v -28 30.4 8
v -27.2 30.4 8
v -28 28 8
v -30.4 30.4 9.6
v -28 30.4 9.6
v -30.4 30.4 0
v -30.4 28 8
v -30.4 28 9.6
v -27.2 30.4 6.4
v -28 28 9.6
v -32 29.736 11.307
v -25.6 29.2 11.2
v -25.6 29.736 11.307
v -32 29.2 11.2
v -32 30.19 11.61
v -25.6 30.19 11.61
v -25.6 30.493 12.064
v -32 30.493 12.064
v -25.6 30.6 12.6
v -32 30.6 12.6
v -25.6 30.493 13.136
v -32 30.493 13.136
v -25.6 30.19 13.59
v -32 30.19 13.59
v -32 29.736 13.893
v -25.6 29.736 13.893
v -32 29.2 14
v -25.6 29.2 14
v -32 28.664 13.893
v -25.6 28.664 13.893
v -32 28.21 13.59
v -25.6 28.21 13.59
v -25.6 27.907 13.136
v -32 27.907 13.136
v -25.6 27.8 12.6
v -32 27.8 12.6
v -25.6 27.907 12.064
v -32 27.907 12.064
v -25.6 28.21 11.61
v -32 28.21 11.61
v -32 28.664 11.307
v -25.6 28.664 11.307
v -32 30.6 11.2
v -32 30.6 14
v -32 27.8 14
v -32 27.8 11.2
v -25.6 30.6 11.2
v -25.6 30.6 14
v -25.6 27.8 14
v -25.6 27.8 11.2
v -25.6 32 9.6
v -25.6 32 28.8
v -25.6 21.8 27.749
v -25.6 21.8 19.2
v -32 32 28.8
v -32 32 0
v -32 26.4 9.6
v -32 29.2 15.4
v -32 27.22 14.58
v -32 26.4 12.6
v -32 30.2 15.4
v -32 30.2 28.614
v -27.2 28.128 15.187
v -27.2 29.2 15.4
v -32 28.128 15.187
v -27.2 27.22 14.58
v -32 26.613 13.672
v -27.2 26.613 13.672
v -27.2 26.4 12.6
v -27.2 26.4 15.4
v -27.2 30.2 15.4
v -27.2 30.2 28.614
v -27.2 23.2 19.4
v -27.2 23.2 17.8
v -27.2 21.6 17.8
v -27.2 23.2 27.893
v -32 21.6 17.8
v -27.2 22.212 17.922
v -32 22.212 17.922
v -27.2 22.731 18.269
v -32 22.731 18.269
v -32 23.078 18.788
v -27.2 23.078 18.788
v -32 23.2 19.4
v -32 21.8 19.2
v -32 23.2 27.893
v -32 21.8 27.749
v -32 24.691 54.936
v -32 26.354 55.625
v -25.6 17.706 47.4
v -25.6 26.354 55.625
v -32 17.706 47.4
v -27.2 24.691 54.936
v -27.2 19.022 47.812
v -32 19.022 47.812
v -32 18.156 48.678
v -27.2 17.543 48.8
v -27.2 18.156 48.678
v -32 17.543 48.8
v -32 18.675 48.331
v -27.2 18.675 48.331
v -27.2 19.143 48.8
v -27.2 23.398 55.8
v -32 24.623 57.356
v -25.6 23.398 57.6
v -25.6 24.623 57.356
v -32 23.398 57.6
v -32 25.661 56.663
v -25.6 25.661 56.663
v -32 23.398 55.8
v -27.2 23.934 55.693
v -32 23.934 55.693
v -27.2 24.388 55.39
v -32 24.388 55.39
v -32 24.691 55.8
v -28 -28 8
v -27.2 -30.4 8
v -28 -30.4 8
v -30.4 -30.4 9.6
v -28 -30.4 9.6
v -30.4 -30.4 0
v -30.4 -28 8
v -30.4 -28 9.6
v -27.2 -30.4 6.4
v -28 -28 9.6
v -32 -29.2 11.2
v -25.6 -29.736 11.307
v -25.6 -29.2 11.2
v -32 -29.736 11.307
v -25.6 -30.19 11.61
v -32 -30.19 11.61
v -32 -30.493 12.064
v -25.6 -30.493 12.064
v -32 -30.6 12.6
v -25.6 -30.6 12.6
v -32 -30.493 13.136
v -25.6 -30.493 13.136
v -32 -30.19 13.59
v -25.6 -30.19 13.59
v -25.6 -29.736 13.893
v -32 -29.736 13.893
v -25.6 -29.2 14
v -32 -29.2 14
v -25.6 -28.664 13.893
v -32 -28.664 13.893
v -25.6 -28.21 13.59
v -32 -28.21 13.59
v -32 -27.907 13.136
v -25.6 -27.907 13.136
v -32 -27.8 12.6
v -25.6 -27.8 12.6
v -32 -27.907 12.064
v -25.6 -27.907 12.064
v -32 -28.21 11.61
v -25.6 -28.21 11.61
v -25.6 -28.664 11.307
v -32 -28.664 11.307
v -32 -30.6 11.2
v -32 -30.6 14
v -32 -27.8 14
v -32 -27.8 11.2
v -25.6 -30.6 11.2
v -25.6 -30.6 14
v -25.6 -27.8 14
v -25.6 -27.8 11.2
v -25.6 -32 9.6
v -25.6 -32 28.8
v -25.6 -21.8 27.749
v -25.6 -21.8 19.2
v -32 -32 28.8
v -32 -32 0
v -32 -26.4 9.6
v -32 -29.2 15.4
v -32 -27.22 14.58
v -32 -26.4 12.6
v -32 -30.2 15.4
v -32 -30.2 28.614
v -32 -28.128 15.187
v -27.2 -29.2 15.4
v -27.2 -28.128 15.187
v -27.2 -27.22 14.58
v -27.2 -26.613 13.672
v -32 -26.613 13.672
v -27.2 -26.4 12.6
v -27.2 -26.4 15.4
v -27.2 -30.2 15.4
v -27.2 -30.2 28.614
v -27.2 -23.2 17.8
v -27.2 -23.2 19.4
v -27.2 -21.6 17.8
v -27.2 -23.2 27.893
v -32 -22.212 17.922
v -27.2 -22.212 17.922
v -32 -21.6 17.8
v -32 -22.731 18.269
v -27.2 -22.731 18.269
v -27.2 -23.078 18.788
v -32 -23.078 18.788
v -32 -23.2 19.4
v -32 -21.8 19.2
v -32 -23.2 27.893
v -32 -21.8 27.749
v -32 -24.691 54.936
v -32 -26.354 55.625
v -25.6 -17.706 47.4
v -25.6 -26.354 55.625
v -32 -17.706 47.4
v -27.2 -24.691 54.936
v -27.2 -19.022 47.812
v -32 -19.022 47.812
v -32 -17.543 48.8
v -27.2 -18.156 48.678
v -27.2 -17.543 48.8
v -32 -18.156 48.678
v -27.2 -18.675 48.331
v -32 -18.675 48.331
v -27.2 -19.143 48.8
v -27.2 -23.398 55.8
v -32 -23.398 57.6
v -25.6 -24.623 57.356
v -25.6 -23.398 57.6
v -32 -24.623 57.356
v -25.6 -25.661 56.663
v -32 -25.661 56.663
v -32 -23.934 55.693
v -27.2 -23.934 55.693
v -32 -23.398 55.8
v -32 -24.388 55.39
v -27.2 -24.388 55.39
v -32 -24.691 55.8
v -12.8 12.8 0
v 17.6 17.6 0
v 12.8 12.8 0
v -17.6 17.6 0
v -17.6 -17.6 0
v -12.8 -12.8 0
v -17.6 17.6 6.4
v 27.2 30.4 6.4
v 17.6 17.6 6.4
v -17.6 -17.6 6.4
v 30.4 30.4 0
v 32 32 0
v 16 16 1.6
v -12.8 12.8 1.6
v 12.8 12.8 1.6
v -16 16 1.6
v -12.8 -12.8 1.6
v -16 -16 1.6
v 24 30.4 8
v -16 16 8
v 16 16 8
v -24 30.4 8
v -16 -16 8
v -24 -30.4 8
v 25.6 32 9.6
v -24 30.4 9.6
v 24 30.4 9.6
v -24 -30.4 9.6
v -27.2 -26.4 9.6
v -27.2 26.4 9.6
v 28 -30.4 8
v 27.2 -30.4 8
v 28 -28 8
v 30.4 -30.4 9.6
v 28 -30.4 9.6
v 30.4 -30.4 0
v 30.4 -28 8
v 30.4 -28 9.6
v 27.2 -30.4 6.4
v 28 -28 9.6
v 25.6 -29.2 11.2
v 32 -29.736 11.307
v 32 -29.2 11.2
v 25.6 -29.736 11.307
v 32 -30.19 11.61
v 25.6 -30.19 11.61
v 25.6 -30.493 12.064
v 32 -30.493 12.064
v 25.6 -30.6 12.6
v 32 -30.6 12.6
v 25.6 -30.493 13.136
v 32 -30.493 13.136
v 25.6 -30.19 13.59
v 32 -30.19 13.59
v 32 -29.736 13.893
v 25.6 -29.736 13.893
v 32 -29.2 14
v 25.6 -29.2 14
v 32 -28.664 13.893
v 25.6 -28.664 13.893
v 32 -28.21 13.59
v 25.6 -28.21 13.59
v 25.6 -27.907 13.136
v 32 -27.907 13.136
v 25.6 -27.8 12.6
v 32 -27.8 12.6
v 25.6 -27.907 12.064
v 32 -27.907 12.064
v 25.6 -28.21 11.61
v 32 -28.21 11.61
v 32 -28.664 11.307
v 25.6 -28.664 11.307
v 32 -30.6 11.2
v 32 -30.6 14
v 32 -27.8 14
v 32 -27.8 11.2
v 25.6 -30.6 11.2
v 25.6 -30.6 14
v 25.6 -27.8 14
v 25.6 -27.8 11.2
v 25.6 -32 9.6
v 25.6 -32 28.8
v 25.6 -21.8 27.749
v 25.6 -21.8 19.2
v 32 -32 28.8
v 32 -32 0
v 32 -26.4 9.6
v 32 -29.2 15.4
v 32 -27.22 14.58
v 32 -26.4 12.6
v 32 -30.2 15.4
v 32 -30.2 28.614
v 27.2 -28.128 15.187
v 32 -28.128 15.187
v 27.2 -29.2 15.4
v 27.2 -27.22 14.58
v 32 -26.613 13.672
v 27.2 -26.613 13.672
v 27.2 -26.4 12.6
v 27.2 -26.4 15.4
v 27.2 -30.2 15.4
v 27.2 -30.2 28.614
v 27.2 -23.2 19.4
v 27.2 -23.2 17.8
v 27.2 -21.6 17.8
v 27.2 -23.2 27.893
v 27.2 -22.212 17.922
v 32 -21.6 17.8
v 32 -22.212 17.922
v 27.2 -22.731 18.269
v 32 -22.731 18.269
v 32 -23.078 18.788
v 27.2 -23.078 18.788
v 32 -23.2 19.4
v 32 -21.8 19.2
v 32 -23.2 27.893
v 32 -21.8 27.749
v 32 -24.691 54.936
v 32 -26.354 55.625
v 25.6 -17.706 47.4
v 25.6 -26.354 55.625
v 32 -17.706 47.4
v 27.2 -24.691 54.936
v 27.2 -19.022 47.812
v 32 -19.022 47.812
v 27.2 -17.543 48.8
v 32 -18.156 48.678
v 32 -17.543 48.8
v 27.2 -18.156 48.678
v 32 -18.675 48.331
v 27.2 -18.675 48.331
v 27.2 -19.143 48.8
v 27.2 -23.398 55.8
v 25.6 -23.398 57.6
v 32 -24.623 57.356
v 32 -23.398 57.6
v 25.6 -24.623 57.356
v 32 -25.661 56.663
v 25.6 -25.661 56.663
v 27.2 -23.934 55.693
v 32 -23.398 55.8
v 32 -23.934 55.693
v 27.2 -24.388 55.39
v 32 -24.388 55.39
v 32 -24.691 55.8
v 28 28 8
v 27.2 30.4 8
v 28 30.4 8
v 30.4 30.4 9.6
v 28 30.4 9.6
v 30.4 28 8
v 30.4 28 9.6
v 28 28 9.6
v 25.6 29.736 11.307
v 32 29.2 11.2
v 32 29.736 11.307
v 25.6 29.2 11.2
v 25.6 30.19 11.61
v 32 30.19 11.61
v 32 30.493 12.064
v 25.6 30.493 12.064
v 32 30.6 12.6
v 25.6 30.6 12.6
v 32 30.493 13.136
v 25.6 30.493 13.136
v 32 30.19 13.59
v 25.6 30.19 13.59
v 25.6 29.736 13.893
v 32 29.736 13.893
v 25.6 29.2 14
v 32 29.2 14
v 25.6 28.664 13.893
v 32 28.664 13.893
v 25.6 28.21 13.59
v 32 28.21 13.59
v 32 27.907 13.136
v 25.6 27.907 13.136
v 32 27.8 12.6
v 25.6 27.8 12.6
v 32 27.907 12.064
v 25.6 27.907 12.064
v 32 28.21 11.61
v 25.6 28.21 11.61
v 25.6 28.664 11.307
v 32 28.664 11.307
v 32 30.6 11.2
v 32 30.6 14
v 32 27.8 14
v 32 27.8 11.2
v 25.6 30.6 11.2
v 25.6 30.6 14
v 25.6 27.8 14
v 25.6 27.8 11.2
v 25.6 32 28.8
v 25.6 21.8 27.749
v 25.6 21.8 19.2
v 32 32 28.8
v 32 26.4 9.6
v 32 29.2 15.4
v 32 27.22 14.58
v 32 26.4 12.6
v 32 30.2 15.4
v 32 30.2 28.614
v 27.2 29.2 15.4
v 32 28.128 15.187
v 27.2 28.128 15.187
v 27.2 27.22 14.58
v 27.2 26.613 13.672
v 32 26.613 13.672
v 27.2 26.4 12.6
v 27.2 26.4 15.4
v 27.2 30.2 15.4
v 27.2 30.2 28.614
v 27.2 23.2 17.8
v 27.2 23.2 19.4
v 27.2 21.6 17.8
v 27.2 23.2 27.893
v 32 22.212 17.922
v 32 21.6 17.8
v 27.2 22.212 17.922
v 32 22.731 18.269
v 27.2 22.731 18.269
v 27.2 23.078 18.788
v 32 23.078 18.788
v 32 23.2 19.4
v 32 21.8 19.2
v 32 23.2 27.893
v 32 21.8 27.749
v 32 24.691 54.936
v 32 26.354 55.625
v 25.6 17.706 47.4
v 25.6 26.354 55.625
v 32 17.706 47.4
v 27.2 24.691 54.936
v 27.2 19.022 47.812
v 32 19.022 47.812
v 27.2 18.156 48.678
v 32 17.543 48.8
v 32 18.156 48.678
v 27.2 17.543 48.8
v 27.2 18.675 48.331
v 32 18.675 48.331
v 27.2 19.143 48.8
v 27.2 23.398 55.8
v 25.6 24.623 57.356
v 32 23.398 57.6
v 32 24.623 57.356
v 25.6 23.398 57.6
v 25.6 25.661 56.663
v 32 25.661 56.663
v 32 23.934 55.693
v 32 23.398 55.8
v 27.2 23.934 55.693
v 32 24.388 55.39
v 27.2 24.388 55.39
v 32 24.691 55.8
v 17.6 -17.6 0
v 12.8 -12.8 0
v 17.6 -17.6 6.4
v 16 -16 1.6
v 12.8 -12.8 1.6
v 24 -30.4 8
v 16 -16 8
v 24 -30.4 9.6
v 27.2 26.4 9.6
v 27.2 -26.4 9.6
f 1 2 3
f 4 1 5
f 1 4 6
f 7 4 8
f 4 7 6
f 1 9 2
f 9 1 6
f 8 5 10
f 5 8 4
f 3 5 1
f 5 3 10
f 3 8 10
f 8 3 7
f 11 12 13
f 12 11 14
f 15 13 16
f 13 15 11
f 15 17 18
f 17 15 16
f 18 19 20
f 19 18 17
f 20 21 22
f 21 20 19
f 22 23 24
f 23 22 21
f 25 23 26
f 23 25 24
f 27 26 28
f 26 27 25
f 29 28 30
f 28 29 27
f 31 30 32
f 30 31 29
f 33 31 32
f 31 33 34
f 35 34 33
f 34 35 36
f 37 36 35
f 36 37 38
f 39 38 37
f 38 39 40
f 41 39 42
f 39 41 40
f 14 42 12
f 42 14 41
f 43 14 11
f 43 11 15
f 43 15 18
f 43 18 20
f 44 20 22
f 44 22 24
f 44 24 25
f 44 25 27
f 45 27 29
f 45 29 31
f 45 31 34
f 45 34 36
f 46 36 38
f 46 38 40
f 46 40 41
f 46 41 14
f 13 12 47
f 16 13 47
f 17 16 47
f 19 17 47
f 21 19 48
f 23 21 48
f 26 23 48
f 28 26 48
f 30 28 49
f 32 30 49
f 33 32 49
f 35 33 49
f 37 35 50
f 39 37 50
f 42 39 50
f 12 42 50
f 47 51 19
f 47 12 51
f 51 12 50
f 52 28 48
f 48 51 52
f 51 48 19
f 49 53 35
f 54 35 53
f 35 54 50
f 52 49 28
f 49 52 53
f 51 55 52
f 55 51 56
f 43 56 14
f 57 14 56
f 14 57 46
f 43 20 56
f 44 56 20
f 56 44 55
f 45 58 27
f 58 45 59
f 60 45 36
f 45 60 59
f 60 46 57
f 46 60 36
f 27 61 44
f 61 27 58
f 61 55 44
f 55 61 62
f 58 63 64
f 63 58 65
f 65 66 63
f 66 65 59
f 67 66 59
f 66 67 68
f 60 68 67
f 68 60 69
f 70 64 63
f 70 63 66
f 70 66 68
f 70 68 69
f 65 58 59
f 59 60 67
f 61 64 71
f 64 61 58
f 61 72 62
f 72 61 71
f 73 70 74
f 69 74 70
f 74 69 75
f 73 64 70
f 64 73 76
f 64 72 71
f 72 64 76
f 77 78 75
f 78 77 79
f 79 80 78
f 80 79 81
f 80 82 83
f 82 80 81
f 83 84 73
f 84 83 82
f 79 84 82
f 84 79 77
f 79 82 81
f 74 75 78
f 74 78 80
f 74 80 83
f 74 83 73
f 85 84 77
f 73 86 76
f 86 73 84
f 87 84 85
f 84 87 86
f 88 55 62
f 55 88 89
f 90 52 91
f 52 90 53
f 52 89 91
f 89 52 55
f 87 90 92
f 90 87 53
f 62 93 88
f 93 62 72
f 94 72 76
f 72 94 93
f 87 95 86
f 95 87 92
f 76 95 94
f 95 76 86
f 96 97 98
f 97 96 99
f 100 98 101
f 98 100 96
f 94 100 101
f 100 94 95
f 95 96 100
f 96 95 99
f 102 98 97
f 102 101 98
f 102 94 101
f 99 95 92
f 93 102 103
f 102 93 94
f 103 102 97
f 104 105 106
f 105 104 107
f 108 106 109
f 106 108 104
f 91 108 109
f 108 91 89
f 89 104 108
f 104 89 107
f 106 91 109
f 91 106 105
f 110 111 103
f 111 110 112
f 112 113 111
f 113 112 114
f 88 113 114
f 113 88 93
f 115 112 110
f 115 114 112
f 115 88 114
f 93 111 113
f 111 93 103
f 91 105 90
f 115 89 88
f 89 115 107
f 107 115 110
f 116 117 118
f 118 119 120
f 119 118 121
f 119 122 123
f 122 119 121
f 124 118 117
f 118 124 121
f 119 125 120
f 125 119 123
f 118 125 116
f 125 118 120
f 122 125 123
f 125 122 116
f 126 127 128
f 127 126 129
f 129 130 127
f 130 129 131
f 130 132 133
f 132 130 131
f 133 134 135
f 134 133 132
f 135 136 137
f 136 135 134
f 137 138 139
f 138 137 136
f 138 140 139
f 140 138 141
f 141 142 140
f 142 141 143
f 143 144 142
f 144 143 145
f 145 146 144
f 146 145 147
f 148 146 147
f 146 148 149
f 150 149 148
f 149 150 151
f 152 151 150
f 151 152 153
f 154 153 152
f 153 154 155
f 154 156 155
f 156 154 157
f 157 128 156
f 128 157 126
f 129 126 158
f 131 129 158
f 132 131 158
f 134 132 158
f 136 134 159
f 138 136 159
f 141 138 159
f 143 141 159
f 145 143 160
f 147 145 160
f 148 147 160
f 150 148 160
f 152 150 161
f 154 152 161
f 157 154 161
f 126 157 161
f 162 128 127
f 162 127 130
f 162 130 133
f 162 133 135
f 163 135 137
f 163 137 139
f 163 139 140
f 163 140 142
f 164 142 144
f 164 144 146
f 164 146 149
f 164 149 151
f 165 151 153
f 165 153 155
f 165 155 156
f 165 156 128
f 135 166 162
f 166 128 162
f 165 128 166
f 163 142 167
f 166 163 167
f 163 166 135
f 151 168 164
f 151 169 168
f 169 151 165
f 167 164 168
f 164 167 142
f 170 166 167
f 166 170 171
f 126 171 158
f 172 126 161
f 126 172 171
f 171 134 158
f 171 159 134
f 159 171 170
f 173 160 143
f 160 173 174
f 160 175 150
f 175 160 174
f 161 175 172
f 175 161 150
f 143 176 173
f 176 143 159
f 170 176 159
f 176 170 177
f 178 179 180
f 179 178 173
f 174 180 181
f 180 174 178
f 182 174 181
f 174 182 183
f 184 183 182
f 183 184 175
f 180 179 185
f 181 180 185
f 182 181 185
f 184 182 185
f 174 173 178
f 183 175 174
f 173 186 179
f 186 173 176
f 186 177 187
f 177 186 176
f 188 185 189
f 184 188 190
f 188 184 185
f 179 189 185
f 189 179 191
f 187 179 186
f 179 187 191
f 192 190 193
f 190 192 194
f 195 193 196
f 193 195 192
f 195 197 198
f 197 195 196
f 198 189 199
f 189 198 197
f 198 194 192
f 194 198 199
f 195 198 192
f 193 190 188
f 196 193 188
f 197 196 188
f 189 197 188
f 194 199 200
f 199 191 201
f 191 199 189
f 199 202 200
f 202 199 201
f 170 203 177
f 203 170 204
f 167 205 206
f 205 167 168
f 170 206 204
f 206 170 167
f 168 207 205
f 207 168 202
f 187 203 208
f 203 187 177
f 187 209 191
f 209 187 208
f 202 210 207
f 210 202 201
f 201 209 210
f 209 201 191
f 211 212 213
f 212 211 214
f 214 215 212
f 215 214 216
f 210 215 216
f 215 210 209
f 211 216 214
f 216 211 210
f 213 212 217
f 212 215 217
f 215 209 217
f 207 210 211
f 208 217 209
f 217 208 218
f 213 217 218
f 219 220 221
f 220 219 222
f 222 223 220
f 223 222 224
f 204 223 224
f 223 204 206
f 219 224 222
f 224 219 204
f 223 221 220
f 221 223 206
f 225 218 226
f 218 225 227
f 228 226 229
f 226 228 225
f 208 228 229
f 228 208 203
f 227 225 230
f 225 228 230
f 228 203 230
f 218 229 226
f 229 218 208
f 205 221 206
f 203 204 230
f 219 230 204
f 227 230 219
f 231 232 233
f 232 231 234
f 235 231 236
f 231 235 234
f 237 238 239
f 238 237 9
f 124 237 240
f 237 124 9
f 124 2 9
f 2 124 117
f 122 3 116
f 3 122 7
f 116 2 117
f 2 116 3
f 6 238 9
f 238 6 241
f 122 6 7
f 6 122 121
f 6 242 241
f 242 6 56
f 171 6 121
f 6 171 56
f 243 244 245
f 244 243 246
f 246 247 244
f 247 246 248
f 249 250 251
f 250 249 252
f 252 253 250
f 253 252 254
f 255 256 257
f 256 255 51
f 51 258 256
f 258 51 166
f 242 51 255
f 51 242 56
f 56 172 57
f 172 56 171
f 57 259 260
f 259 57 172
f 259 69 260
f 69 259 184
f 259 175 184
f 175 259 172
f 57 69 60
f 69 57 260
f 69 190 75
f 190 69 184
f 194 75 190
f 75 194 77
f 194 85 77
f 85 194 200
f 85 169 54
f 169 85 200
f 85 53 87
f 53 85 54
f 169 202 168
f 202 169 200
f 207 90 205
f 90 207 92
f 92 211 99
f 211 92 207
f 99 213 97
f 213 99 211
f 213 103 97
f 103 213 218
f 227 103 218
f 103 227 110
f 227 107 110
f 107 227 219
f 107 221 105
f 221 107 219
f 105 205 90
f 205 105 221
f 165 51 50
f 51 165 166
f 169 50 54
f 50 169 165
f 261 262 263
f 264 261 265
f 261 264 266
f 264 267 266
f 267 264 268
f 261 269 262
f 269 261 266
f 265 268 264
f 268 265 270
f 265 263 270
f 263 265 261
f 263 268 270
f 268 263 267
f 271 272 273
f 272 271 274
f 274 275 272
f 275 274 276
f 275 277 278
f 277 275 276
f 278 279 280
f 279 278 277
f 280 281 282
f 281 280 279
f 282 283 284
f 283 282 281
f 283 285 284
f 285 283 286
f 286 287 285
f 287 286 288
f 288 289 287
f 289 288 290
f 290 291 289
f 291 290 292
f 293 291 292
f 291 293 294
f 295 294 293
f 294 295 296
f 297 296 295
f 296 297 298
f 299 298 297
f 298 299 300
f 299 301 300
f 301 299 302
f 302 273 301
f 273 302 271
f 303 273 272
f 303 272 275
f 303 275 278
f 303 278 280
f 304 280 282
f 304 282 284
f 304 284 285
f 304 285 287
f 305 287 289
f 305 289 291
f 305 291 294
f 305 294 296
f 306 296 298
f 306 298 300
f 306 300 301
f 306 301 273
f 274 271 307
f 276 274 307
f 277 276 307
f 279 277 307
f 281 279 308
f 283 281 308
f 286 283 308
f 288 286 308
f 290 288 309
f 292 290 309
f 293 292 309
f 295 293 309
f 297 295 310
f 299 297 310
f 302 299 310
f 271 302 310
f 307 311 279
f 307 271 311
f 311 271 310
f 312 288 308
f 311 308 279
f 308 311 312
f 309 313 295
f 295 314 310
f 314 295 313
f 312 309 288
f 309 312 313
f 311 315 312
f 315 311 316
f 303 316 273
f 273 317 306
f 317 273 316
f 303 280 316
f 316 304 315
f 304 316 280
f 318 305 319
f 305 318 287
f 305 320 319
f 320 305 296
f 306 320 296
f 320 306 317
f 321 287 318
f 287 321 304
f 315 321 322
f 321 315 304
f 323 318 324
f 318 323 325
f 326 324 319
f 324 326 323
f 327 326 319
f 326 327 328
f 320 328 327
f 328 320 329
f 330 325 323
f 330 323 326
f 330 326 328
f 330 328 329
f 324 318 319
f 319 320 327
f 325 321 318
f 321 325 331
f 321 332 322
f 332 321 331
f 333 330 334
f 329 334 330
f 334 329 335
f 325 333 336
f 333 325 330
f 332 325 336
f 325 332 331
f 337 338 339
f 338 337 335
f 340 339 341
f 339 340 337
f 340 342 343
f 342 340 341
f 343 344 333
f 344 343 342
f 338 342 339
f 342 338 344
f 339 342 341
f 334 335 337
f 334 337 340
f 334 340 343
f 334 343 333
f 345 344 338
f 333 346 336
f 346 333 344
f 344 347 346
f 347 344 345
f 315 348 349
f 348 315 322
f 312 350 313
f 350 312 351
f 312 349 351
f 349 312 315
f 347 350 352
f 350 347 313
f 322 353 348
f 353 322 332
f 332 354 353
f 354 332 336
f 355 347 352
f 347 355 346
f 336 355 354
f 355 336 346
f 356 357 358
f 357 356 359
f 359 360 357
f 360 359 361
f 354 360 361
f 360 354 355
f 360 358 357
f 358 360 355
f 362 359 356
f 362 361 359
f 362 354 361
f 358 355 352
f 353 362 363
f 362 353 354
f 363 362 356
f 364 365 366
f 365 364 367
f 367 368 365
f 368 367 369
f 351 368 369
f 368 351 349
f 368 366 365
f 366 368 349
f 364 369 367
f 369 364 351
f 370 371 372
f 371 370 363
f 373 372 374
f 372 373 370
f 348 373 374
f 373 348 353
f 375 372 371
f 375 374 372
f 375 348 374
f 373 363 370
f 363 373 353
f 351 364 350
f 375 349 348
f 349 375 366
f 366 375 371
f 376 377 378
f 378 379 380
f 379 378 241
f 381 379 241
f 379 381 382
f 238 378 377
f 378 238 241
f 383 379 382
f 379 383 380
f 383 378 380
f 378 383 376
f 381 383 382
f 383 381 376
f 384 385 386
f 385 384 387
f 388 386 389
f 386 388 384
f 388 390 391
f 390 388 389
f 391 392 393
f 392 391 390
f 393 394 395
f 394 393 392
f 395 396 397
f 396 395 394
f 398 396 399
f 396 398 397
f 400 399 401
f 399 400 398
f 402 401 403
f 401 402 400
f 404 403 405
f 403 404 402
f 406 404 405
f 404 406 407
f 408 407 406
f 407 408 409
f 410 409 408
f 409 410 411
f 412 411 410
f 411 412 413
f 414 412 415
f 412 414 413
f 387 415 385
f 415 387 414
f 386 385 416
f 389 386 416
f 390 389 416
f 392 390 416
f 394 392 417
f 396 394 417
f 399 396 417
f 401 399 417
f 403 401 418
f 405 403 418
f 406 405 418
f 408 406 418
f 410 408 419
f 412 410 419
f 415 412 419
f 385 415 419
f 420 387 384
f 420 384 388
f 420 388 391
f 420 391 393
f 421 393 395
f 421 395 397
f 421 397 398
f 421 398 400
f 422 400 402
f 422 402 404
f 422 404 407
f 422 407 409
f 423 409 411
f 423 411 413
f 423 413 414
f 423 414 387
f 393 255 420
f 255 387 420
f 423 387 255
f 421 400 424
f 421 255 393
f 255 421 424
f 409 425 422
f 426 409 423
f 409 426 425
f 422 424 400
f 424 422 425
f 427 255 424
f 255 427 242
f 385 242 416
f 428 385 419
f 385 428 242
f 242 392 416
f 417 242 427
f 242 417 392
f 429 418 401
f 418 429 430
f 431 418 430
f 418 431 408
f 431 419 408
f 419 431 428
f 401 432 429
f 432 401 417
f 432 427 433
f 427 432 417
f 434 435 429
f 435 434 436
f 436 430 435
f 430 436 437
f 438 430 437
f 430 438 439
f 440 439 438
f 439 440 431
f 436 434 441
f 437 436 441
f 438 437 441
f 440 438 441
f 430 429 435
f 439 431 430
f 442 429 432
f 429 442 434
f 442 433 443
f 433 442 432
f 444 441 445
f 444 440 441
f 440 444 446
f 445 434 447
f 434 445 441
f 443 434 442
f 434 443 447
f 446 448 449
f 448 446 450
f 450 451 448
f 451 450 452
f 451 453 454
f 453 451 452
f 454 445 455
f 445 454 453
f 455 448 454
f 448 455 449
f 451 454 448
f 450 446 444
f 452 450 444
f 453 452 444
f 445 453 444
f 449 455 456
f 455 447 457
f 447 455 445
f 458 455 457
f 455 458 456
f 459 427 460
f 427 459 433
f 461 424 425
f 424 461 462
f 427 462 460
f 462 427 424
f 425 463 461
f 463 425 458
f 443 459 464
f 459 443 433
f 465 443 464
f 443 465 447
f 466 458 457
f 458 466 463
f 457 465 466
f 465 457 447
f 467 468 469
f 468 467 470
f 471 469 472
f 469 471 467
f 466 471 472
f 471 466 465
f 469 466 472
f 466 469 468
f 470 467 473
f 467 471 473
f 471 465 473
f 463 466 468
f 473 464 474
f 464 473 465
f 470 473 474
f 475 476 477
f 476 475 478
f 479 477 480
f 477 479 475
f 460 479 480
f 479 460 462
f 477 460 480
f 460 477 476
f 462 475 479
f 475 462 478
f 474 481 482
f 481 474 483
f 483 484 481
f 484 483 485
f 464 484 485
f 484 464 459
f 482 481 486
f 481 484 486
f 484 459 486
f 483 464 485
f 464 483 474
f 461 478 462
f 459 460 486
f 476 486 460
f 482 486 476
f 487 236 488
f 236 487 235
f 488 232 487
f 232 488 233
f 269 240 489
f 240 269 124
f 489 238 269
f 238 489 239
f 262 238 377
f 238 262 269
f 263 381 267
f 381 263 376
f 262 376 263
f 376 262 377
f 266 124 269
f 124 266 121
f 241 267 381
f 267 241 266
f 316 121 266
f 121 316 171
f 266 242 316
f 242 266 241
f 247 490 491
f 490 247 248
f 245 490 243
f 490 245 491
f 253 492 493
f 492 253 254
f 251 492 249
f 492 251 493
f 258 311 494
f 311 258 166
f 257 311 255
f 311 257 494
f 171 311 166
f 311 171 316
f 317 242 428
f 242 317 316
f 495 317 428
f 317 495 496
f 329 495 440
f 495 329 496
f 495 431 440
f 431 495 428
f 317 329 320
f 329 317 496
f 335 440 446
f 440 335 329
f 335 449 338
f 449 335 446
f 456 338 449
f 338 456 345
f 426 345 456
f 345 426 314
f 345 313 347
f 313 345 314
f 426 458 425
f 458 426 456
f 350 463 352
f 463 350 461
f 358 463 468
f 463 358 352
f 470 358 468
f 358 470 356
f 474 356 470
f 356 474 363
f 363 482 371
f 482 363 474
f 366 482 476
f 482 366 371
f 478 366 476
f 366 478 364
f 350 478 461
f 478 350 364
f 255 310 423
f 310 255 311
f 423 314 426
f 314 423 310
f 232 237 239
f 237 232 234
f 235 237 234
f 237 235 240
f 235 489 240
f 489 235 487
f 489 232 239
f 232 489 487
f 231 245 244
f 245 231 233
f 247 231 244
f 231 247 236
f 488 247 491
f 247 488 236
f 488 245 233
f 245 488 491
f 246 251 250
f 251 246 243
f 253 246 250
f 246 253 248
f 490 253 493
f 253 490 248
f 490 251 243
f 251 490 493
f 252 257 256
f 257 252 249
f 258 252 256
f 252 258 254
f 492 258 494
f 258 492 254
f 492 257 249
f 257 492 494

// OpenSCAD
use <../lib.scad>
use <../p/box4.scad>
use <../p/recte4.scad>
use <s/31301s01.scad>
function ldraw_lib__31301() = [
// 0 Duplo Train Compartment/Container Frame  4 x  4 x  3
// 0 Name: 31301.dat
// 0 Author: Gerald Lasser [GeraldLasser]
// 0 !LDRAW_ORG Part UPDATE 2026-08
// 0 !LICENSE Licensed under CC BY 4.0 : see CAreadme.txt
// 
// 0 !HELP Pivot Points are at:
// 0 !HELP X=0, Y=31.5 Z=73.5
// 0 !HELP X=0, Y=31.5 Z=-73.5
// 0 !HELP 1 47 0 -31.5 73.5 1 0 0 0 1 0 0 0 1 31302.dat
// 0 !HELP 1 1 0 -31.5 73.5 1 0 0 0 1 0 0 0 1 31303.dat
// 0 !HELP 1 4 0 -31.5 73.5 1 0 0 0 1 0 0 0 1 31304.dat
// 
// 0 BFC CERTIFY CCW
  [0,"BFC","CERTIFY"],
  [0,"BFC","CCW"],
// 
// 0 !CATEGORY Duplo
// 0 !KEYWORDS Brickowl 448064
// 
// 0 !HISTORY 2026-08-31 [OrionP] Official Update 2026-08
// 
// 1 16 0 0 0 1 0 0 0 1 0 0 0 1 s\31301s01.dat
  [1,16,0,0,0,1,0,0,0,1,0,0,0,1, ldraw_lib__s__31301s01()],
// 1 16 0 0 0 -1 0 0 0 1 0 0 0 -1 s\31301s01.dat
  [1,16,0,0,0,-1,0,0,0,1,0,0,0,-1, ldraw_lib__s__31301s01()],
// 
// 0 // Bottom
// 1 16 0 0 0 80 0 0 0 1 0 0 0 80 recte4.dat
  [1,16,0,0,0,80,0,0,0,1,0,0,0,80, ldraw_lib__recte4()],
// 1 16 0 0 0 76 0 0 0 1 0 0 0 76 recte4.dat
  [1,16,0,0,0,76,0,0,0,1,0,0,0,76, ldraw_lib__recte4()],
// 1 16 0 0 0 44 0 0 0 -16 0 0 0 44 box4.dat
  [1,16,0,0,0,44,0,0,0,-16,0,0,0,44, ldraw_lib__box4()],
// 0 BFC INVERTNEXT
  [0,"BFC","INVERTNEXT"],
// 1 16 0 0 0 32 0 0 0 -4 0 0 0 32 box4.dat
  [1,16,0,0,0,32,0,0,0,-4,0,0,0,32, ldraw_lib__box4()],
// 0 BFC INVERTNEXT
  [0,"BFC","INVERTNEXT"],
// 1 16 0 -4 0 40 0 0 0 -16 0 0 0 40 box4.dat
  [1,16,0,-4,0,40,0,0,0,-16,0,0,0,40, ldraw_lib__box4()],
// 0 BFC INVERTNEXT
  [0,"BFC","INVERTNEXT"],
// 1 16 0 -20 0 60 0 0 0 -4 0 0 0 76 box4.dat
  [1,16,0,-20,0,60,0,0,0,-4,0,0,0,76, ldraw_lib__box4()],
// 
// 1 16 0 -16 0 68 0 0 0 1 0 0 0 76 recte4.dat
  [1,16,0,-16,0,68,0,0,0,1,0,0,0,76, ldraw_lib__recte4()],
// 1 16 0 -24 0 64 0 0 0 1 0 0 0 80 recte4.dat
  [1,16,0,-24,0,64,0,0,0,1,0,0,0,80, ldraw_lib__recte4()],
];
module ldraw_lib__31301(step=0, col=false, unit=2/5, alt=false, line=0.2, solid=!$preview)
    makepoly(ldraw_lib__31301(), step=step, col=col, unit=unit, alt=alt, line=line, solid=solid);
ldraw_lib__31301(line=0.2);
